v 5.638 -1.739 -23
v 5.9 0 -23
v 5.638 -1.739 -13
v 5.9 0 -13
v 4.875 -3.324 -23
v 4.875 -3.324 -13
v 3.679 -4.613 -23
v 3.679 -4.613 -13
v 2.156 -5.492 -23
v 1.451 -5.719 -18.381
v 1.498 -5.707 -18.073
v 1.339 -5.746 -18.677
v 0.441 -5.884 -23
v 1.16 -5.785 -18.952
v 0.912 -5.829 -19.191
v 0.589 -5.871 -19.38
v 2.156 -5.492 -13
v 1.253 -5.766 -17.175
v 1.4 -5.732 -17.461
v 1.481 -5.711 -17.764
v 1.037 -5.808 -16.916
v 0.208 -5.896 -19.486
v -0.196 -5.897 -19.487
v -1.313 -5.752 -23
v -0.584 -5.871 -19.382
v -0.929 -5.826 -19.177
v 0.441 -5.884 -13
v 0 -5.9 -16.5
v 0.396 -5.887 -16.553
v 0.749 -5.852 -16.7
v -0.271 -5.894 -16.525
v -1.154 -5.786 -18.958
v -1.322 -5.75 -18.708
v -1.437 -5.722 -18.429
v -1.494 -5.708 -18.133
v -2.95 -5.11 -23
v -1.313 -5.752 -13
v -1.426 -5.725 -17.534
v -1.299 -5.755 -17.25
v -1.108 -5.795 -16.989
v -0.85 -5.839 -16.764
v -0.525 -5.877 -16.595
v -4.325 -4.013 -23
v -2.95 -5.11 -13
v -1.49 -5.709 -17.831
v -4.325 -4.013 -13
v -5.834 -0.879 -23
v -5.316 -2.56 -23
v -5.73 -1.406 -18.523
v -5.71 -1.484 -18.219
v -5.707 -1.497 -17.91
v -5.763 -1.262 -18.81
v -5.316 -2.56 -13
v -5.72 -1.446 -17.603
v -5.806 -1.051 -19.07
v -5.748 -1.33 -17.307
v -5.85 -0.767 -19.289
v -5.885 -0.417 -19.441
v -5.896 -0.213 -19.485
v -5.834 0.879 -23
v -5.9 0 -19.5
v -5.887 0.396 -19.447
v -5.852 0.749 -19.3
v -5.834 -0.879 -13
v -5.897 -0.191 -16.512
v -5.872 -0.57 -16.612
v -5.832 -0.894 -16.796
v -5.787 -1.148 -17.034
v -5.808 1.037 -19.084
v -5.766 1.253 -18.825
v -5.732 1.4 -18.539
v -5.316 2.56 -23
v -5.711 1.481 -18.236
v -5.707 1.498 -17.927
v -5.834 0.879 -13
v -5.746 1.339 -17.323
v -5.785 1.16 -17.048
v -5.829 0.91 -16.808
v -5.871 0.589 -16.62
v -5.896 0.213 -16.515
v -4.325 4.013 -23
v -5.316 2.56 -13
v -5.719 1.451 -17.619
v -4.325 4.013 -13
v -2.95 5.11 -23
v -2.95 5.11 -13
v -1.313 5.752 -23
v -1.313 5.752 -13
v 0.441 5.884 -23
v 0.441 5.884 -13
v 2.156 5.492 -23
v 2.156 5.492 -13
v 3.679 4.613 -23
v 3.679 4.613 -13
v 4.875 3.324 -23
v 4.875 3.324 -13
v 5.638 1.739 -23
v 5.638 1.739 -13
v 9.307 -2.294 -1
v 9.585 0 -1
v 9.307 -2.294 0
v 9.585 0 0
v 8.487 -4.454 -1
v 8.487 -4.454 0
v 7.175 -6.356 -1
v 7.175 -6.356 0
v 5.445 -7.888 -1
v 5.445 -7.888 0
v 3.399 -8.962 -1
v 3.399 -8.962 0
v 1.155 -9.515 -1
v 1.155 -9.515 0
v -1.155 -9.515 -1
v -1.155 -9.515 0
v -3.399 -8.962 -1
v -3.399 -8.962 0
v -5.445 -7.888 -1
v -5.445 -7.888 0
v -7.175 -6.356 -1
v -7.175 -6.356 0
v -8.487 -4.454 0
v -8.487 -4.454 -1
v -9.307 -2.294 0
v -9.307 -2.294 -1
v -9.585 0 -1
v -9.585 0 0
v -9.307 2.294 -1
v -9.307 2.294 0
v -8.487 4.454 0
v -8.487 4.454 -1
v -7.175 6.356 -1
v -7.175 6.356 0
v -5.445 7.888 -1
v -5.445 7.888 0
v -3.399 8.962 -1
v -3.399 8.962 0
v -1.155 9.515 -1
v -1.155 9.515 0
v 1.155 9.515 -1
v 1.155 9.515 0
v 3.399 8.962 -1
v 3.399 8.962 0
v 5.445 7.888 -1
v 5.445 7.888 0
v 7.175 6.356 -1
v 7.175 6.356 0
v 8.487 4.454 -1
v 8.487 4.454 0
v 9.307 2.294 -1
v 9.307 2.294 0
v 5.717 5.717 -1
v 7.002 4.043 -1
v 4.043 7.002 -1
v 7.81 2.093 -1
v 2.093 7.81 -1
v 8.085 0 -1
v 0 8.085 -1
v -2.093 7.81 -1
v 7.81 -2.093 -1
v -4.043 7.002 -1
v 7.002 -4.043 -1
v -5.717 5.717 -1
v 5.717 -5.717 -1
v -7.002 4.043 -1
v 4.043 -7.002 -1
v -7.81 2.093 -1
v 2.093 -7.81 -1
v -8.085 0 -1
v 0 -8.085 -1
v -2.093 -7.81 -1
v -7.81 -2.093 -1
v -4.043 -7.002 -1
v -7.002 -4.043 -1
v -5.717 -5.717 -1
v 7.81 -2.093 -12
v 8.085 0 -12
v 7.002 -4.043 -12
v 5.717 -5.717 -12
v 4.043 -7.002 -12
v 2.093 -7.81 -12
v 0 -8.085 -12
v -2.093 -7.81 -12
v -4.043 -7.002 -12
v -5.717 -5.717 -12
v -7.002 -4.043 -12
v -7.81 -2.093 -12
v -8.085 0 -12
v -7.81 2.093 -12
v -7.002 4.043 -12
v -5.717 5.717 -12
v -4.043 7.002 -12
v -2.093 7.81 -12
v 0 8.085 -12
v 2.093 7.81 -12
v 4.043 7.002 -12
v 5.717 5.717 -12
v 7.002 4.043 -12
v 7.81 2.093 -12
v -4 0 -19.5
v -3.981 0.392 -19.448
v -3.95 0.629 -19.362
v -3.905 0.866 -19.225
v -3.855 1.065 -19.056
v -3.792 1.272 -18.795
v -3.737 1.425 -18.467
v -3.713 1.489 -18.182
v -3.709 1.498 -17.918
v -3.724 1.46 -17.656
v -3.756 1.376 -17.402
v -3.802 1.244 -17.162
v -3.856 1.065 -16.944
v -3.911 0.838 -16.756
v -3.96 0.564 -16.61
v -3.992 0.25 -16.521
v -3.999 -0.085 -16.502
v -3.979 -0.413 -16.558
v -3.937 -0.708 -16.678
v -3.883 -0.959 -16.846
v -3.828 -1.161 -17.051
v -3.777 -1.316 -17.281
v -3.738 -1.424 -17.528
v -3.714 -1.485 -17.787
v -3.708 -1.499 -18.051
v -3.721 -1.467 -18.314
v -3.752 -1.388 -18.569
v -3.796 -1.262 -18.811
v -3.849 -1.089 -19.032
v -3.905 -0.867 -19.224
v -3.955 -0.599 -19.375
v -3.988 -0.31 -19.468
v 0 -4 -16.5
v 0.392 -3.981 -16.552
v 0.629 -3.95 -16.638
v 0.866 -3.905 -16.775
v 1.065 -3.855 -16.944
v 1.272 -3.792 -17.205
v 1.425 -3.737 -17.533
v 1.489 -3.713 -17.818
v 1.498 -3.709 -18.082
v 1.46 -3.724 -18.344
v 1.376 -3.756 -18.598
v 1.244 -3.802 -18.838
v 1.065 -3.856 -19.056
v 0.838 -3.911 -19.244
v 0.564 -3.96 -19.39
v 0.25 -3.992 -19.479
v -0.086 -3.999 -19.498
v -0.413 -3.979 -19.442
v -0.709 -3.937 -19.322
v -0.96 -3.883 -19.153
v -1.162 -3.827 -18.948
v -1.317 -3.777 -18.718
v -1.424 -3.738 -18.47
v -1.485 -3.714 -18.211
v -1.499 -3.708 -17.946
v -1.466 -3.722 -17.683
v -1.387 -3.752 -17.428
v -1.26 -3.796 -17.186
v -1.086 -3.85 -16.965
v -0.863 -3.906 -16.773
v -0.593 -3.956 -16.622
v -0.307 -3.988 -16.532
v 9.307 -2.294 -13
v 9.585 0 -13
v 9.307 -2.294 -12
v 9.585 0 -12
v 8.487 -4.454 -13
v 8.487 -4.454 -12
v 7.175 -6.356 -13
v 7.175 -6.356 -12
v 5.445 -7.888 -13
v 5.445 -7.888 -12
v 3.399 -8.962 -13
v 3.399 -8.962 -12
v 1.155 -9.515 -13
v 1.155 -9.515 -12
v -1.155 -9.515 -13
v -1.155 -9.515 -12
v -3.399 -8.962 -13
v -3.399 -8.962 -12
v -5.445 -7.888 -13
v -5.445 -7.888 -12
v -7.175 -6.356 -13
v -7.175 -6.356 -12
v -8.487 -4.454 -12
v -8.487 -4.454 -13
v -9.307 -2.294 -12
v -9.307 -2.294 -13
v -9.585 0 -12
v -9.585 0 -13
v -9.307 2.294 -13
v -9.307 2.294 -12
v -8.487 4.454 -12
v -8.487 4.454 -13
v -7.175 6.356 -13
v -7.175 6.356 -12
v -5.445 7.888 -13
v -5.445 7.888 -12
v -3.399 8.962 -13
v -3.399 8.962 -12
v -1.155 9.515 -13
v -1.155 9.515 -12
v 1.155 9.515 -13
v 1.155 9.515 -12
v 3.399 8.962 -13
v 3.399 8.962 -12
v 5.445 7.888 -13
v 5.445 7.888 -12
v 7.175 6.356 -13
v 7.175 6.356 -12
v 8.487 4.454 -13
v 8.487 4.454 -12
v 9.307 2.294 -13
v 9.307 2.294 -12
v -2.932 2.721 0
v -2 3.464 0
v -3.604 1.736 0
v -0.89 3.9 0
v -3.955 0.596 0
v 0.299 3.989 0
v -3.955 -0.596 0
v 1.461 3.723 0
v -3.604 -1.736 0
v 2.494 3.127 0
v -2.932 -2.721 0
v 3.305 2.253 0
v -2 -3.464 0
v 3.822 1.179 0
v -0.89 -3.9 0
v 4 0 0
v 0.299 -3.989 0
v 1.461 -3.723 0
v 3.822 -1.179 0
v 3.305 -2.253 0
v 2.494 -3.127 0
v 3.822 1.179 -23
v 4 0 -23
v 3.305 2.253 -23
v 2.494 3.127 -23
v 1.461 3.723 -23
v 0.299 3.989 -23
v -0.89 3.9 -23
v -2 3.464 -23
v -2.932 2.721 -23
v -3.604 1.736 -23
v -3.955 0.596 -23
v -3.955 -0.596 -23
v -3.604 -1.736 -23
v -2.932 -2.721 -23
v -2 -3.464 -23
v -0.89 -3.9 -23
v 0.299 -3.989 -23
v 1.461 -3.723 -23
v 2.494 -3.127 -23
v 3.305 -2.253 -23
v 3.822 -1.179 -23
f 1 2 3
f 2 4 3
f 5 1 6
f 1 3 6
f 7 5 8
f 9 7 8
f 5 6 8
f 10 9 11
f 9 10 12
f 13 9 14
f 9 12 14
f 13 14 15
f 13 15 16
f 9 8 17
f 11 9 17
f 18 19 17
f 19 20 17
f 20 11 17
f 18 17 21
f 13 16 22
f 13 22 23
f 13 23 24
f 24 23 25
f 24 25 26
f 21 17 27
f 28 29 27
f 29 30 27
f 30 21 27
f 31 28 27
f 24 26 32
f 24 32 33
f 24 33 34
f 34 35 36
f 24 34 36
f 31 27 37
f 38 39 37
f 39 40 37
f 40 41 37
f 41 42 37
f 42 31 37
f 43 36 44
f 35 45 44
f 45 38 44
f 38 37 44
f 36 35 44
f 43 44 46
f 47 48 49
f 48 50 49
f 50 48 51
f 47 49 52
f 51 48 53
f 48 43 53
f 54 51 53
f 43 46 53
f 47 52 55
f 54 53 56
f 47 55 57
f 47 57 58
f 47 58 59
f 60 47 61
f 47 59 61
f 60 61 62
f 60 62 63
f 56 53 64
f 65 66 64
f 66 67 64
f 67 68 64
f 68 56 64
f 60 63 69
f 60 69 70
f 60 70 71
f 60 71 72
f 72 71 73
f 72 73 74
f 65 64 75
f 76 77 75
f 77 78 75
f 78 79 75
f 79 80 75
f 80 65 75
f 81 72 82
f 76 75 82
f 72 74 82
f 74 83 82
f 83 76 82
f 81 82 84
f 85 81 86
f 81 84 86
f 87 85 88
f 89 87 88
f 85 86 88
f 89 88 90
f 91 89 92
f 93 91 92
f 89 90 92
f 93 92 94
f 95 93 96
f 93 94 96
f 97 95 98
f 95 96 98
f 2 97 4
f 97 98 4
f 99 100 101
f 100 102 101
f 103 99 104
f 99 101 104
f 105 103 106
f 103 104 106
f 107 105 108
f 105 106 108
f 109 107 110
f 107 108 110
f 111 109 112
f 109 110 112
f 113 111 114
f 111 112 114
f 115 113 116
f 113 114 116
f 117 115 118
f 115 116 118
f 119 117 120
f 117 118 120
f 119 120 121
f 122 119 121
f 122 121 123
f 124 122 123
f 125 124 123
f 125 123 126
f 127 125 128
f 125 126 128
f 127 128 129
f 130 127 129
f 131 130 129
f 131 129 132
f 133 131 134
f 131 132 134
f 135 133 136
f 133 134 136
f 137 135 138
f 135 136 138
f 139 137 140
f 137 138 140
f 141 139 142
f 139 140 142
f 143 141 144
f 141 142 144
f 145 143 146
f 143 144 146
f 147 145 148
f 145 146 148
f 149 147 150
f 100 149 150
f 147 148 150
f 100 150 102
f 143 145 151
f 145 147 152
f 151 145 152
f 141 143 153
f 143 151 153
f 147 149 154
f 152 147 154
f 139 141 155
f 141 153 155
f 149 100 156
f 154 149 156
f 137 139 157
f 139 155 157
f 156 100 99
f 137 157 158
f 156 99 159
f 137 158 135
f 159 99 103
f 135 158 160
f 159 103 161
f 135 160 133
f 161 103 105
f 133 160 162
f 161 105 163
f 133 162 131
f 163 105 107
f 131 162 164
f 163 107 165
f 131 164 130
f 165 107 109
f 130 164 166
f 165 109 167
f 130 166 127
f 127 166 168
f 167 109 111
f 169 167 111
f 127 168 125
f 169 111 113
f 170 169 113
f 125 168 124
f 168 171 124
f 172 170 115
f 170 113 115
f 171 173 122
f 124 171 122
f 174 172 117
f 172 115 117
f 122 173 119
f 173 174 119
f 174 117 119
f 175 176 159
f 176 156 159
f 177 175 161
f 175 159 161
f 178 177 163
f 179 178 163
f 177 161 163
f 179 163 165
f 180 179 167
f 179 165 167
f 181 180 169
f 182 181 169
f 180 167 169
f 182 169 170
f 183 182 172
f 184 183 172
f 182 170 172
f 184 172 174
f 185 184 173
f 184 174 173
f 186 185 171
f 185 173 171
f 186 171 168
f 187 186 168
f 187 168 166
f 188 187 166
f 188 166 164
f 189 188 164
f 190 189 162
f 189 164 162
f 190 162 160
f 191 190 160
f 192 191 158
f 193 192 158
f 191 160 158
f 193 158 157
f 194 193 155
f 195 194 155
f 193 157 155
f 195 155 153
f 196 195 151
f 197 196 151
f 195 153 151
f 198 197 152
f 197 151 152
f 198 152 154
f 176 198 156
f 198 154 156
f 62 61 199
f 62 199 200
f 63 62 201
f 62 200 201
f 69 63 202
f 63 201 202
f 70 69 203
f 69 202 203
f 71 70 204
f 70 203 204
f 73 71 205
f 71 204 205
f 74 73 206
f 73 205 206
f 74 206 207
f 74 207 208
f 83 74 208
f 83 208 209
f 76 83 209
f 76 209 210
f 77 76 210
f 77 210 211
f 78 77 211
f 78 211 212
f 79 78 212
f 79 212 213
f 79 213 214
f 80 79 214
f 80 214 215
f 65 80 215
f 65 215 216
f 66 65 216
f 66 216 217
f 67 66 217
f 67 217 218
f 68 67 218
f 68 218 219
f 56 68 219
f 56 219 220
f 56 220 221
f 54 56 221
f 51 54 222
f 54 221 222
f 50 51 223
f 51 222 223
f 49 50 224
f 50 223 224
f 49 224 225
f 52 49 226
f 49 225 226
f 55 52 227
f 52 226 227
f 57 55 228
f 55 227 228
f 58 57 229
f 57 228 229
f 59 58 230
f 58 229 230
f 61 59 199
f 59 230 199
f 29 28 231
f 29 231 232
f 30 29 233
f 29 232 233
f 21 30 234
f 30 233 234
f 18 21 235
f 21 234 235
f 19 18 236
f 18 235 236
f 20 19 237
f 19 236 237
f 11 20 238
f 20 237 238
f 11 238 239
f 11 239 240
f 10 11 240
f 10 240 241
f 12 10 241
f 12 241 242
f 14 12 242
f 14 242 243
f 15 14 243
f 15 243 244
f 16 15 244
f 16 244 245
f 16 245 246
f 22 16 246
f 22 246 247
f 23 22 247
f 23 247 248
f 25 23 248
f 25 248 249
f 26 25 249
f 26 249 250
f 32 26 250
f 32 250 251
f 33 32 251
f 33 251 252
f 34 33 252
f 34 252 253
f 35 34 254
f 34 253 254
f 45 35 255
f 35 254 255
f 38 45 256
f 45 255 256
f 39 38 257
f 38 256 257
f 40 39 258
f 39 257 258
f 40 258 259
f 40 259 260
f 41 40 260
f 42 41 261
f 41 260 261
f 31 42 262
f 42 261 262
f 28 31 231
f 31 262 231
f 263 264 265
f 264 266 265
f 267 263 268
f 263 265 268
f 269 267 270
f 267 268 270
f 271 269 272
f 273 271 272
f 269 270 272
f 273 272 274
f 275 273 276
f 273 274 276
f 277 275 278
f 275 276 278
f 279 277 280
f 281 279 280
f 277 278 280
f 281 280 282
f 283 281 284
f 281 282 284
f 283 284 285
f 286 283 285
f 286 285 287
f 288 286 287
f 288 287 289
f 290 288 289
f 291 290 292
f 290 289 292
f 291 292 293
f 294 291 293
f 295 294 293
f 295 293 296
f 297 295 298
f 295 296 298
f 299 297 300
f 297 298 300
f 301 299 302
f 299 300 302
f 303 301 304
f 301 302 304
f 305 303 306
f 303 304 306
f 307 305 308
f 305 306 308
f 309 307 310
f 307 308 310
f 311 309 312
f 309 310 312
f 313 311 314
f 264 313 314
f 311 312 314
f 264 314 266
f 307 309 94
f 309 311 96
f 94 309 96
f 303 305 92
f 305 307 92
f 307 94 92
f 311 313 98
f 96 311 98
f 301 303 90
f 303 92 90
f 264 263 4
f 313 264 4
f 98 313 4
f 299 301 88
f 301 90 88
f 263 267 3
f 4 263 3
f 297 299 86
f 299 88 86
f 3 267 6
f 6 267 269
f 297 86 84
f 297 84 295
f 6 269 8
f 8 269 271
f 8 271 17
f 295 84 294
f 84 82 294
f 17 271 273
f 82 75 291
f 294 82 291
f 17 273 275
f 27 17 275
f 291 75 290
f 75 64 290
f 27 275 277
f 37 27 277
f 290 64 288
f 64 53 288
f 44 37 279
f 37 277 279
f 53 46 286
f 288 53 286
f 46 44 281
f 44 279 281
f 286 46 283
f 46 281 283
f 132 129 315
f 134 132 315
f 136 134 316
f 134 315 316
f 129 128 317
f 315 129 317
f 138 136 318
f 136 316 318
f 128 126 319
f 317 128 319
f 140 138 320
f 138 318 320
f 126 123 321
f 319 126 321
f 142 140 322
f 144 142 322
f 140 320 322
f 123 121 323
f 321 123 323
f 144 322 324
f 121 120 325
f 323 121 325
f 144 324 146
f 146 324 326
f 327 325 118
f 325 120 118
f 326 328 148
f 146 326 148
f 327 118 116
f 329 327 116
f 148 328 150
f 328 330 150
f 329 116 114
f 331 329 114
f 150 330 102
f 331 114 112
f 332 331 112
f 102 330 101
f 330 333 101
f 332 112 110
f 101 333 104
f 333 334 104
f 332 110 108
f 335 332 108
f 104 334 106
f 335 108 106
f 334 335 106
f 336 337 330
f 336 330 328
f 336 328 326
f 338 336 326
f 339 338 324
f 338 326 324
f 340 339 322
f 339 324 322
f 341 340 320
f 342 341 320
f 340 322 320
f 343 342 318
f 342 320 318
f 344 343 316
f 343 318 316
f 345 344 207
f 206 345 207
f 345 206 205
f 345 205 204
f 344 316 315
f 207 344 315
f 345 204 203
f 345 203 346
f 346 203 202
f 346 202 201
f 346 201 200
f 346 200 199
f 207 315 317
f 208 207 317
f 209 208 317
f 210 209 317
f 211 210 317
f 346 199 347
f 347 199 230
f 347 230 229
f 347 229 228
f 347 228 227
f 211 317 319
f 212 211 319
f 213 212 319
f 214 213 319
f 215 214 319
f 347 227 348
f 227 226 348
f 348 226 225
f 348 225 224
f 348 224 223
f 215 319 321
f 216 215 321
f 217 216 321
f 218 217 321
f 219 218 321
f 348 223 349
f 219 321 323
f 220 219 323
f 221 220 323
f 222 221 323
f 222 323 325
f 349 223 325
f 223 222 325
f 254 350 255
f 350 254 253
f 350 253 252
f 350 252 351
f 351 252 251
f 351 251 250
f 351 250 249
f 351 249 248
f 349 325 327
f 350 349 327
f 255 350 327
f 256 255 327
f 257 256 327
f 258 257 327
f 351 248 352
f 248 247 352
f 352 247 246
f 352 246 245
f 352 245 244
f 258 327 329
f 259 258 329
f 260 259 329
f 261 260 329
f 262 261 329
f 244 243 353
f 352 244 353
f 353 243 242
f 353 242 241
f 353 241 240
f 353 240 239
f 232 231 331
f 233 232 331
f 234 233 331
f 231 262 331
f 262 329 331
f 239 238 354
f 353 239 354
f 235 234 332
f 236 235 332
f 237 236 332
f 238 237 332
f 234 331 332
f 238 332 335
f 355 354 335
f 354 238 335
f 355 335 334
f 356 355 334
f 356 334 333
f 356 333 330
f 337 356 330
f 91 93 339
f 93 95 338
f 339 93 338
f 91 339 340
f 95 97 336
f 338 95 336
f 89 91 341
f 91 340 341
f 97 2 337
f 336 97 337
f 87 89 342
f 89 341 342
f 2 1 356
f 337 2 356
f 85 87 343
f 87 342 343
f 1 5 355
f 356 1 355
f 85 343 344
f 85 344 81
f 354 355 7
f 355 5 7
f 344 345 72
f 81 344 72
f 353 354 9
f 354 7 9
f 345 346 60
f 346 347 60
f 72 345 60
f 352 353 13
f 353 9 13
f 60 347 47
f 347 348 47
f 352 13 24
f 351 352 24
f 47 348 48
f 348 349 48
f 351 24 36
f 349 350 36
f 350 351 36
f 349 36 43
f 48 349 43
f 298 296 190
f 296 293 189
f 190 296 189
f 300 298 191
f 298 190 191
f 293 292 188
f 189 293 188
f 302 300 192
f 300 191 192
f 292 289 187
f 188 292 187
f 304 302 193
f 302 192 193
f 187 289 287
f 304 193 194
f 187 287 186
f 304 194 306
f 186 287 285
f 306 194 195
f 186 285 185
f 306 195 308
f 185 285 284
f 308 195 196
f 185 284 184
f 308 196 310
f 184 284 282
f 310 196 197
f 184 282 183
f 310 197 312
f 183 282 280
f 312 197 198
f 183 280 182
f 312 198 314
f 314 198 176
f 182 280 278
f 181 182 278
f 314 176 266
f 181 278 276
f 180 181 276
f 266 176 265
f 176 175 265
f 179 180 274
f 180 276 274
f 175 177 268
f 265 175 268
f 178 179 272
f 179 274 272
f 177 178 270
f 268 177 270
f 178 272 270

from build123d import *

# Parameters (mm, degrees)
SKETCH2_R          = 4
CUT_EXTRUDE1_DEPTH = 27.697325265
SKETCH3_R          = 1.5
CUT_EXTRUDE2_DEPTH = 27.697325265
SKETCH4_R          = 1.5
CUT_EXTRUDE3_DEPTH = 27.697325352


with BuildPart() as part:
    # Sketch1 → Revolve1 (revolve)
    with BuildSketch(Plane(origin=(0, 0, 0), x_dir=(1, 0, 0), z_dir=(0, 1, 0)), mode=Mode.PRIVATE) as revolve1_sk:
        Polygon((0, 23), (-5.9, 23), (-5.9, 13), (-9.585071109, 13), (-9.585071109, 12), (-8.085071109, 12), (-8.085071109, 1), (-9.585071109, 1), (-9.585071109, 0), (0, 0), align=None)
    revolve(revolve1_sk.sketch.rotate(Axis((0, 0, 0), (0, 0, -1)), 180), axis=Axis((0, 0, 0), (0, 0, -1)))

    # Sketch2 → Cut-Extrude1 (cut, through all)
    with BuildSketch(Plane.XY):
        Circle(SKETCH2_R)
    extrude(amount=-CUT_EXTRUDE1_DEPTH, mode=Mode.SUBTRACT)

    # Sketch3 → Cut-Extrude2 (cut, through all)
    with BuildSketch(Plane(origin=(0, 0, 0), x_dir=(1, 0, 0), z_dir=(0, 1, 0))):
        with Locations(Location((0, 18, 0), (0, 0, 270))):
            Circle(SKETCH3_R)
    extrude(amount=-CUT_EXTRUDE2_DEPTH, mode=Mode.SUBTRACT)

    # Sketch4 → Cut-Extrude3 (cut, through all)
    with BuildSketch(Plane(origin=(0, 0, 0), x_dir=(0, 0, -1), z_dir=(1, 0, 0))):
        with Locations((18, 0)):
            Circle(SKETCH4_R)
    extrude(amount=-CUT_EXTRUDE3_DEPTH, mode=Mode.SUBTRACT)


solid = part.part
